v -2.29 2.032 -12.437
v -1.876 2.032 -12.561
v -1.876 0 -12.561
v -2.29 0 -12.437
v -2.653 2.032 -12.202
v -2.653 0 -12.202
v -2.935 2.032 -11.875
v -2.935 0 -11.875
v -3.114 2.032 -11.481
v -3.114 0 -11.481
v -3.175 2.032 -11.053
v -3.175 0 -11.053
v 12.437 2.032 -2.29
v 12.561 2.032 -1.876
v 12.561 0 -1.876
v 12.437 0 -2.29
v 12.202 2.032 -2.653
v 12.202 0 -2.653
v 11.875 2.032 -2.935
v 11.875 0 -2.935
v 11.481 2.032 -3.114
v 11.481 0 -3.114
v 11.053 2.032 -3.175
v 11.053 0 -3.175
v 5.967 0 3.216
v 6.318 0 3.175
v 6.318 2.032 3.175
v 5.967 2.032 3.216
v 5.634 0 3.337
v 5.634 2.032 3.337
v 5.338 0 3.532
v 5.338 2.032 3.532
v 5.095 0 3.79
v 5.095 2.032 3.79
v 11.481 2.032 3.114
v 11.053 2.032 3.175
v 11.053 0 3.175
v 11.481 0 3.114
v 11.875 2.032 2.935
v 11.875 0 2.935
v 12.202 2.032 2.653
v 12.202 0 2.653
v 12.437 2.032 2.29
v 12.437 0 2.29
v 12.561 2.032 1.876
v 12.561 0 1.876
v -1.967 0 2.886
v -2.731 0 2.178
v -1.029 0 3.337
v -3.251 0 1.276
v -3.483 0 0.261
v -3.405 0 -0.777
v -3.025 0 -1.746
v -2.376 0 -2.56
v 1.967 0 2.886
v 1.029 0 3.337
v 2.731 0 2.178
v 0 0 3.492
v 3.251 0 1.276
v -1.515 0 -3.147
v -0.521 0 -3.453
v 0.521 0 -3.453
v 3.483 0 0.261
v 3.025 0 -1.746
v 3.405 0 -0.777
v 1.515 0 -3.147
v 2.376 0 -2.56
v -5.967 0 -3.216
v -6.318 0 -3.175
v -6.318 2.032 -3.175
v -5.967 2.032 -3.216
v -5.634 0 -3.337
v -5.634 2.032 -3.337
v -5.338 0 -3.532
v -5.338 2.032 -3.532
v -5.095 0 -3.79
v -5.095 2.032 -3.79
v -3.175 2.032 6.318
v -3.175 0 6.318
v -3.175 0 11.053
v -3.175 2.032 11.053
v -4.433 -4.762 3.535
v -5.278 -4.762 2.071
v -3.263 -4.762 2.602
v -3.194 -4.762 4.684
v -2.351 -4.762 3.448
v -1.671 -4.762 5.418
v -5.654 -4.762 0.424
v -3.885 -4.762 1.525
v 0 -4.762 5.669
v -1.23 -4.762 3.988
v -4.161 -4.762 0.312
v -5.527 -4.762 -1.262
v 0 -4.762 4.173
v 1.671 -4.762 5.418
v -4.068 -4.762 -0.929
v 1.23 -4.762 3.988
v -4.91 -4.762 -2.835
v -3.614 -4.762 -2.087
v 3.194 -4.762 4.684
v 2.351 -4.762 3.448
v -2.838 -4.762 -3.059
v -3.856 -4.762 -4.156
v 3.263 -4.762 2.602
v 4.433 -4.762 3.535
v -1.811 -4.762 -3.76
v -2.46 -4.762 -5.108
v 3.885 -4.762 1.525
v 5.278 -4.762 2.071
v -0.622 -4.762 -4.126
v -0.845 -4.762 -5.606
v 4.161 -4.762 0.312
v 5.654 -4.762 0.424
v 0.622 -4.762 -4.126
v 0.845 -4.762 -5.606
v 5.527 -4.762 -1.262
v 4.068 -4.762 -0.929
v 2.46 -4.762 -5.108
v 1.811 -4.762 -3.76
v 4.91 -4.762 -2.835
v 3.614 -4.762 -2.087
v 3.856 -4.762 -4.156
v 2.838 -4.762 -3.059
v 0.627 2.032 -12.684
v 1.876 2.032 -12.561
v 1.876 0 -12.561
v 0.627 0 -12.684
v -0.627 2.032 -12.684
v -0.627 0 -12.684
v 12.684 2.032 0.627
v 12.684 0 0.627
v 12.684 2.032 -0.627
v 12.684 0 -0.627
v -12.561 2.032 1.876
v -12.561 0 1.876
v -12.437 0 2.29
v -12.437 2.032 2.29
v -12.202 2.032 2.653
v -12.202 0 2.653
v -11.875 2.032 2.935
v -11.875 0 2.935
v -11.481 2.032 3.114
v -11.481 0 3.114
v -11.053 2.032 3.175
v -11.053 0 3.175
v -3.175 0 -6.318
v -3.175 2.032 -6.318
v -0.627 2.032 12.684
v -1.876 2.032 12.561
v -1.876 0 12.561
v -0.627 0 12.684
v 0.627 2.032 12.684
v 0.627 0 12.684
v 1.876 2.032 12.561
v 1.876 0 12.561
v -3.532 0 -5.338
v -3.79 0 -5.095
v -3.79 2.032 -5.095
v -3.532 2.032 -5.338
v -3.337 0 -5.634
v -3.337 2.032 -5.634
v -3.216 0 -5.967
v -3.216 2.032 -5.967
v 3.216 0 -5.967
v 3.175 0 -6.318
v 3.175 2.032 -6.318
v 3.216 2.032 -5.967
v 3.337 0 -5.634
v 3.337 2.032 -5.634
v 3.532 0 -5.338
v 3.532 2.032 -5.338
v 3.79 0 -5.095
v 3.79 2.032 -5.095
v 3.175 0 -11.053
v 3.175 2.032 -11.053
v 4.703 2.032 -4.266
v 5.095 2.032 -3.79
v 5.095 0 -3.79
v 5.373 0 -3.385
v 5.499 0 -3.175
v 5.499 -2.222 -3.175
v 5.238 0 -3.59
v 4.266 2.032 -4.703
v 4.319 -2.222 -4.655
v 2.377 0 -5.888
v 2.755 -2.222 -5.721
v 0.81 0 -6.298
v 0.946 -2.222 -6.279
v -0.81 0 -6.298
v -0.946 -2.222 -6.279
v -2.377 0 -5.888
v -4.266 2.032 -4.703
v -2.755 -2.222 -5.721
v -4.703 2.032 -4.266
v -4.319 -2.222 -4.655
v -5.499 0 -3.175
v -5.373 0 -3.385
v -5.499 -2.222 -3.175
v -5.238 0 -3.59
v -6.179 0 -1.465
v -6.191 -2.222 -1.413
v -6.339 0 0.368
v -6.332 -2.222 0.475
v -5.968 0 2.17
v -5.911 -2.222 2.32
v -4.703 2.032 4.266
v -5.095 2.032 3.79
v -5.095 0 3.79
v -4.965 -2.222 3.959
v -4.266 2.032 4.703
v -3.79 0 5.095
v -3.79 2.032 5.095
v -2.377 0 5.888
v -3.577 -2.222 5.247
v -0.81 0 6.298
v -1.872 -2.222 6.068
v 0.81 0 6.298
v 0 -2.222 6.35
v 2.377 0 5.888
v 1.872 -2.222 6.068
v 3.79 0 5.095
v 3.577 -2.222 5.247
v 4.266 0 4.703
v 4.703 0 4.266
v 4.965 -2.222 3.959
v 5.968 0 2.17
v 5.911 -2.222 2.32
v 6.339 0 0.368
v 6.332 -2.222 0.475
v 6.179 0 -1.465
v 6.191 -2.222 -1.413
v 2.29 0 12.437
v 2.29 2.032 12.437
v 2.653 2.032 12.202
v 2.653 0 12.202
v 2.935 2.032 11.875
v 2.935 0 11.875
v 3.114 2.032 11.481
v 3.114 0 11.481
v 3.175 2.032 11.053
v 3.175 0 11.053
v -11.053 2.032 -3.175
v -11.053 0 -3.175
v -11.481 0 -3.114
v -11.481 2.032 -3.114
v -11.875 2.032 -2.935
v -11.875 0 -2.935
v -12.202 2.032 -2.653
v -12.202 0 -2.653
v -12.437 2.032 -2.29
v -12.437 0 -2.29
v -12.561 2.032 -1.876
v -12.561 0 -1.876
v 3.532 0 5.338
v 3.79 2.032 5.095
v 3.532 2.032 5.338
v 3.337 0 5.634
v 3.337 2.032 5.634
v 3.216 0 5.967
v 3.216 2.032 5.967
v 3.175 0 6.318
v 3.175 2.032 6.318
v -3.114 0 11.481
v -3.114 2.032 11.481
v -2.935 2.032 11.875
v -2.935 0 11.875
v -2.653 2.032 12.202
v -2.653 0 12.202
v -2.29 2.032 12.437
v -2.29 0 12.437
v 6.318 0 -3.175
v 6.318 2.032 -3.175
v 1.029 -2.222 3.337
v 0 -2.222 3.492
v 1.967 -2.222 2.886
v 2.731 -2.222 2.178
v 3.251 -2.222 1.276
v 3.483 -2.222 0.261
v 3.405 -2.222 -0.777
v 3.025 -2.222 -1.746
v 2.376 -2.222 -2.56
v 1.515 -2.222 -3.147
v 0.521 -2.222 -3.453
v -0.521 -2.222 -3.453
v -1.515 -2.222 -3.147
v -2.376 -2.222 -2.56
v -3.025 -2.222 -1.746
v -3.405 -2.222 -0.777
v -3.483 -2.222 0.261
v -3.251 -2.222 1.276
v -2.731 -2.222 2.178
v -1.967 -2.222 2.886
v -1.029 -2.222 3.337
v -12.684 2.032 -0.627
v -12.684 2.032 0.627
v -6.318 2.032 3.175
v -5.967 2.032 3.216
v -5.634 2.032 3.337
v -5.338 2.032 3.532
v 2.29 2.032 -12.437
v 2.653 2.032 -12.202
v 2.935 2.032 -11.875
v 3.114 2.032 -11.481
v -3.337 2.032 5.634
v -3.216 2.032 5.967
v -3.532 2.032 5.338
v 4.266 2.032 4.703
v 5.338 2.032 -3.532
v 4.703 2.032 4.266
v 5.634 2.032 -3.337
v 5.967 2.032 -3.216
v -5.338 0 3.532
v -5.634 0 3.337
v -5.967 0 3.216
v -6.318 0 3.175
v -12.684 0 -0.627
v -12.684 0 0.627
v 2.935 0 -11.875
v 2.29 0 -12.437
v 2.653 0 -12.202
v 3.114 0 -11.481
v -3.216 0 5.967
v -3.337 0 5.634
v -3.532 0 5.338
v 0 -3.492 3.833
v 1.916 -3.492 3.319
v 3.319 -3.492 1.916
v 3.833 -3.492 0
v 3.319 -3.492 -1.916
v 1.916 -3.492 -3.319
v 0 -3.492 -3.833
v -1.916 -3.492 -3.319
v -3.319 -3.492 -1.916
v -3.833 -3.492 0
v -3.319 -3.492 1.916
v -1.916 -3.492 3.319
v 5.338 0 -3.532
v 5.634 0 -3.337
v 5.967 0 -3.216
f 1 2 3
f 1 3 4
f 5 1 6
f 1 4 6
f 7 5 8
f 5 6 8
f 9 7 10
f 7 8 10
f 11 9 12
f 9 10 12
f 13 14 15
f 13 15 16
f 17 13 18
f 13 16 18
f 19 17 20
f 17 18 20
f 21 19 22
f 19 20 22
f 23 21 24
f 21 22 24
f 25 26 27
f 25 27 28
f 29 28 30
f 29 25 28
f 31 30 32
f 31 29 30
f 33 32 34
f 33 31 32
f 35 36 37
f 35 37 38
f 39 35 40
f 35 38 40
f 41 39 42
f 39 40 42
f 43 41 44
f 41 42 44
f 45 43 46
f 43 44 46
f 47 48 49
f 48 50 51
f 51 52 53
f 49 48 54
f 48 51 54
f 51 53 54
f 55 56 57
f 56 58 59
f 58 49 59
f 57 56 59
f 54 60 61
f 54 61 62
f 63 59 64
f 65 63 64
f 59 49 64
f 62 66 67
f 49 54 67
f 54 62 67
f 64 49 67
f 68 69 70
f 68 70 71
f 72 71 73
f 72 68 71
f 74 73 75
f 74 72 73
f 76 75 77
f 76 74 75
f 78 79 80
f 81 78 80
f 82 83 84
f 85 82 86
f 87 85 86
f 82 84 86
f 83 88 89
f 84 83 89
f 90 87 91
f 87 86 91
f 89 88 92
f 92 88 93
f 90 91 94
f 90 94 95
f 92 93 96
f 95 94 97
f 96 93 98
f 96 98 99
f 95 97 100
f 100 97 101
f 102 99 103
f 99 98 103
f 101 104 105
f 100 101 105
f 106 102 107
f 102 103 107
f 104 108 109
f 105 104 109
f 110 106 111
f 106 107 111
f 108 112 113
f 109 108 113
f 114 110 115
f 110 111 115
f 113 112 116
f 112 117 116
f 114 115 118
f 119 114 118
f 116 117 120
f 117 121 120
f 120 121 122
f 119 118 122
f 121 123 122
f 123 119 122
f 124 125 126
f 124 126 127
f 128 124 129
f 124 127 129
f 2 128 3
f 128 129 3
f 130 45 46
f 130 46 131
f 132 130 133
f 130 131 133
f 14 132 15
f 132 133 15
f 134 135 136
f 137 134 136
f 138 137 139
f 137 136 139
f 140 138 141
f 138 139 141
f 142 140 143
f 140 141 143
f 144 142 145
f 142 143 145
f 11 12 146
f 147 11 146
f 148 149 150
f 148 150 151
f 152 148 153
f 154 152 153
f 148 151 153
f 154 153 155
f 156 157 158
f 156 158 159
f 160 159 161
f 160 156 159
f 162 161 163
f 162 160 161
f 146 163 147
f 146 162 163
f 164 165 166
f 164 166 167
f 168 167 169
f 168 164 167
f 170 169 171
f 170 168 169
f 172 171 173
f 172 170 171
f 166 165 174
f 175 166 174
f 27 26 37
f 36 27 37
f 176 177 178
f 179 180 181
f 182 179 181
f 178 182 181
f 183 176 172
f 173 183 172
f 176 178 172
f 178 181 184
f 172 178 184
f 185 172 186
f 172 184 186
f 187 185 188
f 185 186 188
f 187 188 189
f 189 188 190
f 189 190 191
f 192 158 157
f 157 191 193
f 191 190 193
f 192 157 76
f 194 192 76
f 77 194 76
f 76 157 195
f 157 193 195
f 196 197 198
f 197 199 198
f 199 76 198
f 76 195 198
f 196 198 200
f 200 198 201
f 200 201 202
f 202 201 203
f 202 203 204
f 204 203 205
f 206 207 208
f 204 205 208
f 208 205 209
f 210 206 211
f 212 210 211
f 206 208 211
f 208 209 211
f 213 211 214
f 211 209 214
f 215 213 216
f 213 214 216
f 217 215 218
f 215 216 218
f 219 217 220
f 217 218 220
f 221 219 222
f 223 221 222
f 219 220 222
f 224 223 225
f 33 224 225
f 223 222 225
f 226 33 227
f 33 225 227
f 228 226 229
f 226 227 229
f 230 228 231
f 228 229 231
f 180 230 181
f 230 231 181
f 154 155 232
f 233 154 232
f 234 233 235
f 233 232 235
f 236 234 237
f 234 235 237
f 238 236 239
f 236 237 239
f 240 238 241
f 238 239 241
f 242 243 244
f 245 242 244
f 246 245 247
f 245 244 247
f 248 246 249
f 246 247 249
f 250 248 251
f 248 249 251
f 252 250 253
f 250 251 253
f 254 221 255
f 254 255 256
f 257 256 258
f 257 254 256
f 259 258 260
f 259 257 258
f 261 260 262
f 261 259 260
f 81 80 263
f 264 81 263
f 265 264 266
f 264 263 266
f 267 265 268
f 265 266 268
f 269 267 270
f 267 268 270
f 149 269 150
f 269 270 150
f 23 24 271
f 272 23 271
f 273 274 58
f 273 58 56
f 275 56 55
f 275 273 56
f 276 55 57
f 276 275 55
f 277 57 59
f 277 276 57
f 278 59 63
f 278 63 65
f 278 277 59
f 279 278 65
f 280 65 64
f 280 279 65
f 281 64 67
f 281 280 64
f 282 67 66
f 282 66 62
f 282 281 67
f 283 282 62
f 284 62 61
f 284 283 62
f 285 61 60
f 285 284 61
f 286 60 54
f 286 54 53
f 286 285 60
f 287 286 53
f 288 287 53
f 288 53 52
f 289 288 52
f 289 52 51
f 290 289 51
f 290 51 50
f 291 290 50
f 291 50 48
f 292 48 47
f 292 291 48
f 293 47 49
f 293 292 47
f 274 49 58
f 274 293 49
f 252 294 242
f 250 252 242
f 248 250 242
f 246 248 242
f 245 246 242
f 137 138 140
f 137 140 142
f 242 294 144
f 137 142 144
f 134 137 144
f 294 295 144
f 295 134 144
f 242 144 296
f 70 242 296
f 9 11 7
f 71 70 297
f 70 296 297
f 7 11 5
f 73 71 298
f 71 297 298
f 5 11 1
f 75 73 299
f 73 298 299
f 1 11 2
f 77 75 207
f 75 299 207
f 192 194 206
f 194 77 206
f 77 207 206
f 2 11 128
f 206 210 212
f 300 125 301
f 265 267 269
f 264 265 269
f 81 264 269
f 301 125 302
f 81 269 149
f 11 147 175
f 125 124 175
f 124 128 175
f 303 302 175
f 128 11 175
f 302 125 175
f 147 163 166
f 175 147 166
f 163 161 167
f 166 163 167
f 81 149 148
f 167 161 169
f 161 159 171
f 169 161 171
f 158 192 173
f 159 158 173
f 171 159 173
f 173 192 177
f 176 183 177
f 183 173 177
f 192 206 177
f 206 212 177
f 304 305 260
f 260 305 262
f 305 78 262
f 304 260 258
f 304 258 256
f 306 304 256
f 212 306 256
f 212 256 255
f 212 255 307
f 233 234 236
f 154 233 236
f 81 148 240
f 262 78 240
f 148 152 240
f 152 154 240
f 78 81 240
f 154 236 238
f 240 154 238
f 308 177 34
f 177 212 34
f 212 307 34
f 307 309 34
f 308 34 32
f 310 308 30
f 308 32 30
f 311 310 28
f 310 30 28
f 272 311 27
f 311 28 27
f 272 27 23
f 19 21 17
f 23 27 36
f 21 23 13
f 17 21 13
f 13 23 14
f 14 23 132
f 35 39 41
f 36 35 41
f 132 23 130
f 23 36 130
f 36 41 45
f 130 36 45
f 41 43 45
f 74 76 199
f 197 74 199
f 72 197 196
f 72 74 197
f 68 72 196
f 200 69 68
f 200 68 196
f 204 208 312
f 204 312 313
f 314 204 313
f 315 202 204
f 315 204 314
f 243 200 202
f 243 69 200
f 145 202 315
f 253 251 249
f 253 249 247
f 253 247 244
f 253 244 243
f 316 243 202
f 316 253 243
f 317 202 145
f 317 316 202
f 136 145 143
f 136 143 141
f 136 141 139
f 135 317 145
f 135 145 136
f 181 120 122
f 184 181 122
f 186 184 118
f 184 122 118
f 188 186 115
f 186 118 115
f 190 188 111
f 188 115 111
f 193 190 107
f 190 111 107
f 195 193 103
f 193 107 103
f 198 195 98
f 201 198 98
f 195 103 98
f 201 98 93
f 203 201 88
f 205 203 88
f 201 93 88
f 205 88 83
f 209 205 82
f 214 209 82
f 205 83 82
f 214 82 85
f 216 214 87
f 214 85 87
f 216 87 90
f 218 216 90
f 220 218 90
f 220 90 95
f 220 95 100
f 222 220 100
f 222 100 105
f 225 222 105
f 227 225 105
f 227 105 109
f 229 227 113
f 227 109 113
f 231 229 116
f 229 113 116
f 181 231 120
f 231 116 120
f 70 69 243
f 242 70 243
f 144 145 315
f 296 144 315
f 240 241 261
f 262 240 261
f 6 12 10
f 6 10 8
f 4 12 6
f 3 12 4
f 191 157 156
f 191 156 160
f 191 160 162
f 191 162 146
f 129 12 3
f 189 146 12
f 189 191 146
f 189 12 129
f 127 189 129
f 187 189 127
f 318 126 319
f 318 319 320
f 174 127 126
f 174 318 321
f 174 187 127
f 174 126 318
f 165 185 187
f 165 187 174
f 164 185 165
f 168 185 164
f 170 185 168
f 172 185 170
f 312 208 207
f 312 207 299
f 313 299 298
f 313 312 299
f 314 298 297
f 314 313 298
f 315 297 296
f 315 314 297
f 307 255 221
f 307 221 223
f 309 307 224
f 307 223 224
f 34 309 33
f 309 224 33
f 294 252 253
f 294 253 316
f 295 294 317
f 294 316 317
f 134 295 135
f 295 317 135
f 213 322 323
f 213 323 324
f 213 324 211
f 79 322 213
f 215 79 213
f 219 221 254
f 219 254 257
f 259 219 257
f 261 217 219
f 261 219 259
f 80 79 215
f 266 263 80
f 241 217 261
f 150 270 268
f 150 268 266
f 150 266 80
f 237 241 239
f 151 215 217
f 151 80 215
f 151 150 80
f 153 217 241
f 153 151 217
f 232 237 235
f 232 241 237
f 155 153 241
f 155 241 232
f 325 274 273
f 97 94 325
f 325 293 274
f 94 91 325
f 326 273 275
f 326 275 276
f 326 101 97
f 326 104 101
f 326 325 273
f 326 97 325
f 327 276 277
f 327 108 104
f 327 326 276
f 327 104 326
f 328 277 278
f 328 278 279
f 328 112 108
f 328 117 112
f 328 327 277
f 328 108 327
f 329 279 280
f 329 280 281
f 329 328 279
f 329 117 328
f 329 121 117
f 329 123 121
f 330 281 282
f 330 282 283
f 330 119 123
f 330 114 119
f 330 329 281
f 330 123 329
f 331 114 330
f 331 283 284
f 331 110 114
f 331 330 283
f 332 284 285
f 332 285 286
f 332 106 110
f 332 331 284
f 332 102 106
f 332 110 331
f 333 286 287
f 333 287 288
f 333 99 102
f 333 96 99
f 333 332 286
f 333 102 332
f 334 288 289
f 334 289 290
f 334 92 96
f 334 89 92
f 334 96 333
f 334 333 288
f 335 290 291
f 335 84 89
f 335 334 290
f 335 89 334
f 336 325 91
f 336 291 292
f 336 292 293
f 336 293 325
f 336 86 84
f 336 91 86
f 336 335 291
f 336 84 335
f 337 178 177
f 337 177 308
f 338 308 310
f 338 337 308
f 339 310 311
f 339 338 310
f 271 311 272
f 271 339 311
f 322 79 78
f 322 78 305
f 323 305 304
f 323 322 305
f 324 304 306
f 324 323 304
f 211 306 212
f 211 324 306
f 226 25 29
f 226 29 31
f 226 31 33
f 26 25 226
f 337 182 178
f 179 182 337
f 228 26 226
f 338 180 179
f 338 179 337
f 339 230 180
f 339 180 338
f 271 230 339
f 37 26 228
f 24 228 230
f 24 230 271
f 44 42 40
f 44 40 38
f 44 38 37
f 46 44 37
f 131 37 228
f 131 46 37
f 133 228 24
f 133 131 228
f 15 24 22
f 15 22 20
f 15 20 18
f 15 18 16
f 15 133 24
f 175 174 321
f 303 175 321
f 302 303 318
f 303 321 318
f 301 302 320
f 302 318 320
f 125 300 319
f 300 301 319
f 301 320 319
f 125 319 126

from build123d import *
from OCP.BRepFilletAPI import BRepFilletAPI_MakeChamfer

# Parameters (mm, degrees)
BOSS_EXTRUDE1_DEPTH = 2.032
BOSS_EXTRUDE2_START = -4.762499999999999
SKETCH1_3_R         = 3.4925
BOSS_EXTRUDE2_DEPTH = 4.762499999999999
CHAMFER1_SIZE       = 2.54
CHAMFER1_SIZE2      = 0.6805909487750533
FILLET2_R           = 1.524


with BuildPart() as part:
    # Sketch1 → Boss-Extrude1 (new body)
    with BuildSketch(Plane(origin=(0, 0, 0), x_dir=(1, 0, 0), z_dir=(0, 1, 0))):
        with BuildLine():
            Line((-3.1749999999999994, 12.29672212420855), (-3.175, 5.499261314031185))
            ThreePointArc((-3.1750000000000007, 5.499261314031186), (-4.490128060534577, 4.490128060534578), (-5.499261314031186, 3.1750000000000016))
            Line((-5.499261314031183, 3.1750000000000007), (-12.296722124208548, 3.1750000000000034))
            ThreePointArc((-12.296722124208548, 3.175000000000004), (-12.700000000000001, 1.56e-15), (-12.29672212420855, -3.175000000000001))
            Line((-12.296722124208545, -3.1750000000000003), (-5.499261314031183, -3.175000000000001))
            ThreePointArc((-5.499261314031185, -3.175000000000003), (-4.490128060534575, -4.490128060534579), (-3.174999999999998, -5.499261314031186))
            Line((-3.174999999999998, -5.499261314031185), (-3.1749999999999976, -12.296722124208545))
            ThreePointArc((-3.1750000000000047, -12.296722124208548), (-2.33e-15, -12.700000000000001), (3.175, -12.29672212420855))
            Line((3.175000000000002, -12.296722124208543), (3.175000000000001, -5.499261314031185))
            ThreePointArc((3.175, -5.499261314031186), (4.490128060534578, -4.490128060534577), (5.499261314031187, -3.1749999999999994))
            Line((5.499261314031186, -3.1749999999999985), (12.296722124208548, -3.1749999999999954))
            ThreePointArc((12.296722124208552, -3.174999999999996), (12.700000000000003, 4.44e-15), (12.296722124208548, 3.1750000000000043))
            Line((12.296722124208546, 3.1750000000000043), (5.499261314031185, 3.1750000000000007))
            ThreePointArc((5.499261314031187, 3.175), (4.490128060534579, 4.490128060534575), (3.1749999999999994, 5.499261314031187))
            Line((3.1749999999999994, 5.499261314031186), (3.175, 12.296722124208548))
            ThreePointArc((3.1750000000000003, 12.29672212420855), (8.9e-16, 12.700000000000001), (-3.1749999999999985, 12.29672212420855))
        make_face()
    extrude(amount=BOSS_EXTRUDE1_DEPTH)

    # Sketch1<3> → Boss-Extrude2 (add)
    with BuildSketch(Plane(origin=(0, 0, 0), x_dir=(1, 0, 0), z_dir=(0, 1, 0)).offset(BOSS_EXTRUDE2_START)):
        with BuildLine():
            ThreePointArc((3.174999999999999, 5.499261314031186), (-1.02e-15, 6.35), (-3.175000000000001, 5.499261314031184))
            ThreePointArc((-3.175000000000001, 5.499261314031184), (-4.490128060534576, 4.490128060534577), (-5.499261314031184, 3.175000000000002))
            ThreePointArc((-5.499261314031184, 3.175000000000002), (-6.35, 7.8e-16), (-5.499261314031185, -3.1750000000000007))
            ThreePointArc((-5.499261314031185, -3.1750000000000007), (-4.490128060534575, -4.490128060534578), (-3.174999999999997, -5.499261314031187))
            ThreePointArc((-3.174999999999997, -5.499261314031187), (-1.17e-15, -6.35), (3.1750000000000007, -5.499261314031185))
            ThreePointArc((3.1750000000000007, -5.499261314031185), (4.4901280605345795, -4.490128060534573), (5.499261314031187, -3.1749999999999976))
            ThreePointArc((5.499261314031187, -3.1749999999999976), (6.133628996935584, -1.6435009364010063), (6.35, -1.56e-15))
            ThreePointArc((6.35, 0), (6.133628996935584, 1.6435009364010074), (5.499261314031185, 3.1750000000000007))
            ThreePointArc((5.499261314031185, 3.1750000000000007), (4.490128060534575, 4.490128060534578), (3.174999999999999, 5.499261314031186))
        make_face()
        with Locations(Location((0, 0, 0), (0, 0, 270))):
            Circle(SKETCH1_3_R, mode=Mode.SUBTRACT)
    extrude(amount=BOSS_EXTRUDE2_DEPTH)

    # Chamfer1: one chamfer whose edges measure the first distance from different faces: ONE call of the kernel's chamfer builder (chamfer() names one face for all edges)
    chamfer1_edges_1 = [part.edges().sort_by_distance(p)[0] for p in [
        (3.174999999999999, -4.762499999999999, -5.499261314031194),
    ]]
    chamfer1_side_1 = [part.faces().sort_by_distance(p)[0] for p in [
        (3.1749999999999865, -2.3812499999999996, -5.499261314031195),
    ]]
    chamfer1_edges_2 = [part.edges().sort_by_distance(p)[0] for p in [
        (1.07e-15, -4.762499999999999, -3.4925),
    ]]
    chamfer1_side_2 = [part.faces().sort_by_distance(p)[0] for p in [
        (1.07e-15, -2.3812499999999996, -3.4925),
    ]]
    chamfer1 = BRepFilletAPI_MakeChamfer(part.part.solid().wrapped)
    for e in chamfer1_edges_1:
        chamfer1.Add(CHAMFER1_SIZE, CHAMFER1_SIZE2, e.wrapped, chamfer1_side_1[0].wrapped)  # the first distance lies on this face
    for e in chamfer1_edges_2:
        chamfer1.Add(CHAMFER1_SIZE, CHAMFER1_SIZE2, e.wrapped, chamfer1_side_2[0].wrapped)  # the first distance lies on this face
    add(Compound.cast(chamfer1.Shape()), mode=Mode.REPLACE)

    # Fillet2
    # the kernel refuses this fillet: 1.524 mm, written as the material it adds along each edge
    with BuildSketch(Plane(origin=(3.174999999999999, 0, -5.499261314031187), x_dir=(0.8356194334098629, 0, 0.5493088043239246), z_dir=(0, 1, 0))) as fillet2_piece_1:
        with BuildLine():
            CenterArc((0.8236501414377086, 1.521442818511674), FILLET2_R, 213.31960697214814, 53.3607860557035)
            Line((-0.44983387507892303, 0.6842962007220136), (0, 0))
            ThreePointArc((0, 0), (0.3677009559989754, 0.01065492286802284), (0.7354019119979511, -2e-17))
        make_face()
    extrude(amount=2.032)
    with BuildSketch(Plane(origin=(5.499261314031186, 0, -3.1750000000000007), x_dir=(-0.5493088043239264, 0, -0.8356194334098619), z_dir=(0, 1, 0))) as fillet2_piece_2:
        with BuildLine():
            CenterArc((0.8236501414377053, -1.5214428185116746), FILLET2_R, 93.31960697214826, 53.360786055703514)
            Line((-0.4498338750789252, -0.6842962007220122), (0, 0))
            ThreePointArc((0, 0), (0.36770095599897556, -0.01065492286802262), (0.7354019119979507, -5e-17))
        make_face()
    extrude(amount=2.032)
    with BuildSketch(Plane(origin=(5.499261314031186, 0, 3.174999999999999), x_dir=(-0.5493088043238707, 0, 0.8356194334098983), z_dir=(0, 1, 0))) as fillet2_piece_3:
        with BuildLine():
            CenterArc((0.82365014143777, 1.5214428185116702), FILLET2_R, 213.31960697214453, 53.36078605570418)
            Line((-0.44983387507891454, 0.6842962007220903), (0, 0))
            ThreePointArc((0, 0), (0.36770095599897146, 0.0106549228680418), (0.7354019119979344, 0))
        make_face()
    extrude(amount=2.032)
    with BuildSketch(Plane(origin=(3.1750000000000007, 0, 5.499261314031186), x_dir=(0.8356194334099104, 0, -0.5493088043238523), z_dir=(0, 1, 0))) as fillet2_piece_4:
        with BuildLine():
            CenterArc((0.8236501414377962, -1.5214428185116662), FILLET2_R, 93.31960697215332, 53.360786055703485)
            Line((-0.44983387507890776, -0.684296200722116), (0, 0))
            ThreePointArc((0, 0), (0.3677009559989559, -0.01065492286805522), (0.7354019119979073, 0))
        make_face()
    extrude(amount=2.032)
    with BuildSketch(Plane(origin=(-3.1749999999999976, 0, 5.499261314031186), x_dir=(-0.8356194334099473, 0, -0.5493088043237963), z_dir=(0, 1, 0))) as fillet2_piece_5:
        with BuildLine():
            CenterArc((0.8236501414378631, 1.5214428185116622), FILLET2_R, 213.31960697213952, 53.36078605570407)
            Line((-0.44983387507889466, 0.6842962007221938), (0, 0))
            ThreePointArc((0, 0), (0.3677009559989472, 0.01065492286807322), (0.7354019119978917, 3e-17))
        make_face()
    extrude(amount=2.032)
    with BuildSketch(Plane(origin=(-5.499261314031184, 0, 3.1750000000000025), x_dir=(0.5493088043237985, 0, 0.8356194334099457), z_dir=(0, 1, 0))) as fillet2_piece_6:
        with BuildLine():
            CenterArc((0.823650141437862, -1.521442818511662), FILLET2_R, 93.31960697215631, 53.36078605570414)
            Line((-0.44983387507889533, -0.6842962007221932), (0, 0))
            ThreePointArc((0, 0), (0.36770095599894603, -0.01065492286807348), (0.7354019119978936, -3e-17))
        make_face()
    extrude(amount=2.032)
    with BuildSketch(Plane(origin=(-5.499261314031185, 0, -3.1750000000000016), x_dir=(0.5493088043238532, 0, -0.8356194334099099), z_dir=(0, 1, 0))) as fillet2_piece_7:
        with BuildLine():
            CenterArc((0.8236501414377951, 1.5214428185116664), FILLET2_R, 213.3196069721432, 53.36078605570356)
            Line((-0.44983387507890893, 0.6842962007221164), (0, 0))
            ThreePointArc((0, 0), (0.3677009559989552, 0.01065492286805513), (0.7354019119979077, 3e-17))
        make_face()
    extrude(amount=2.032)
    with BuildSketch(Plane(origin=(-3.1750000000000007, 0, -5.499261314031186), x_dir=(-0.8356194334098974, 0, 0.5493088043238722), z_dir=(0, 1, 0))) as fillet2_piece_8:
        with BuildLine():
            CenterArc((0.8236501414377697, -1.5214428185116697), FILLET2_R, 93.31960697215125, 53.36078605570417)
            Line((-0.44983387507891404, -0.6842962007220886), (0, 0))
            ThreePointArc((0, 0), (0.3677009559989685, -0.01065492286804046), (0.7354019119979357, 0))
        make_face()
    extrude(amount=2.032)
    # the kernel refuses this fillet: 1.524 mm, written as the material it takes off along each edge
    with BuildSketch(Plane(origin=(3.175, -3.313522044377113, -12.29672212420855), x_dir=(-0.9799720802882134, 0, -0.1991349337901098), z_dir=(0, 1, 0))) as fillet2_2_piece_1:
        with BuildLine():
            CenterArc((1.2458842886857948, 1.5219237330684425), FILLET2_R, 191.48637688209308, 81.5047584217437)
            Line((-0.24759316167344236, 1.218442093972315), (0, 0))
            ThreePointArc((0, 0), (0.662704408875422, -0.01730222442965028), (1.325408817750845, 1e-17))
        make_face()
    extrude(amount=8.659044088754227, mode=Mode.SUBTRACT)
    with BuildSketch(Plane(origin=(12.29672212420855, -3.313522044377107, -3.1750000000000043), x_dir=(-1, 0, 3.6e-16), z_dir=(0, 1, 0))) as fillet2_2_piece_2:
        with BuildLine():
            CenterArc((1.2433436813975, 1.524), FILLET2_R, 188.49524157825633, 81.50475842174365)
            ThreePointArc((-0.2639351971676436, 1.2988636363636346), (-0.14892329545175875, 0.6459863408655977), (0, 0))
            Line((0, 0), (1.2433436813974996, 0))
        make_face()
    extrude(amount=8.659044088754214, mode=Mode.SUBTRACT)
    with BuildSketch(Plane(origin=(12.29672212420855, -3.3135220443771116, 3.1749999999999954), x_dir=(0.19913493379011118, 0, -0.979972080288213), z_dir=(0, 1, 0))) as fillet2_2_piece_3:
        with BuildLine():
            CenterArc((1.2458842886857922, 1.5219237330684423), FILLET2_R, 191.48637688209323, 81.50475842174365)
            Line((-0.24759316167344428, 1.218442093972311), (0, 0))
            ThreePointArc((0, 0), (0.6627044088754224, -0.0173022244296529), (1.3254088177508445, -3e-17))
        make_face()
    extrude(amount=8.659044088754225, mode=Mode.SUBTRACT)
    with BuildSketch(Plane(origin=(3.1750000000000016, -3.3135220443771147, 12.296722124208548), x_dir=(-0.979972080288213, 0, 0.19913493379011105), z_dir=(0, 1, 0))) as fillet2_2_piece_4:
        with BuildLine():
            CenterArc((1.245884288685793, -1.521923733068442), FILLET2_R, 87.00886469616313, 81.50475842174379)
            Line((-0.24759316167344436, -1.2184420939723146), (0, 0))
            ThreePointArc((0, 0), (0.6627044088754228, 0.0173022244296529), (1.3254088177508452, 4e-17))
        make_face()
    extrude(amount=8.65904408875423, mode=Mode.SUBTRACT)
    with BuildSketch(Plane(origin=(-3.1749999999999976, -3.313522044377123, 12.29672212420855), x_dir=(0, 0, -1), z_dir=(0, 1, 0))) as fillet2_2_piece_5:
        with BuildLine():
            CenterArc((1.2433436813975014, -1.524), FILLET2_R, 90, 81.50475842174376)
            ThreePointArc((-0.26393519716764224, -1.2988636363636372), (-0.14892329545176075, -0.6459863408655981), (0, 0))
            Line((0, 0), (1.2433436813975014, 0))
        make_face()
    extrude(amount=8.659044088754246, mode=Mode.SUBTRACT)
    with BuildSketch(Plane(origin=(-12.29672212420855, -3.313522044377118, 3.1750000000000003), x_dir=(1, 0, 0), z_dir=(0, 1, 0))) as fillet2_2_piece_6:
        with BuildLine():
            CenterArc((1.2433436813975014, 1.524), FILLET2_R, 188.4952415782562, 81.50475842174376)
            ThreePointArc((-0.26393519716764224, 1.298863636363638), (-0.1489232954517643, 0.6459863408655999), (0, 0))
            Line((0, 0), (1.2433436813975014, 0))
        make_face()
    extrude(amount=8.659044088754236, mode=Mode.SUBTRACT)
    with BuildSketch(Plane(origin=(-12.29672212420855, -3.3135220443771147, -3.1750000000000034), x_dir=(-0.1991349337901111, 0, 0.9799720802882133), z_dir=(0, 1, 0))) as fillet2_2_piece_7:
        with BuildLine():
            CenterArc((1.2458842886857935, 1.5219237330684425), FILLET2_R, 191.4863768820932, 81.50475842174365)
            Line((-0.24759316167344286, 1.2184420939723115), (0, 0))
            ThreePointArc((0, 0), (0.662704408875423, -0.01730222442965109), (1.3254088177508456, -2e-17))
        make_face()
    extrude(amount=8.65904408875423, mode=Mode.SUBTRACT)
    with BuildSketch(Plane(origin=(-3.1749999999999994, -3.3135220443771085, -12.296722124208546), x_dir=(0, 0, 1), z_dir=(0, 1, 0))) as fillet2_2_piece_8:
        with BuildLine():
            CenterArc((1.2433436813974978, 1.524), FILLET2_R, 188.4952415782563, 81.5047584217437)
            ThreePointArc((-0.2639351971676458, 1.2988636363636357), (-0.1489232954517643, 0.6459863408655977), (0, 0))
            Line((0, 0), (1.2433436813974978, 0))
        make_face()
    extrude(amount=8.659044088754218, mode=Mode.SUBTRACT)


solid = part.part
